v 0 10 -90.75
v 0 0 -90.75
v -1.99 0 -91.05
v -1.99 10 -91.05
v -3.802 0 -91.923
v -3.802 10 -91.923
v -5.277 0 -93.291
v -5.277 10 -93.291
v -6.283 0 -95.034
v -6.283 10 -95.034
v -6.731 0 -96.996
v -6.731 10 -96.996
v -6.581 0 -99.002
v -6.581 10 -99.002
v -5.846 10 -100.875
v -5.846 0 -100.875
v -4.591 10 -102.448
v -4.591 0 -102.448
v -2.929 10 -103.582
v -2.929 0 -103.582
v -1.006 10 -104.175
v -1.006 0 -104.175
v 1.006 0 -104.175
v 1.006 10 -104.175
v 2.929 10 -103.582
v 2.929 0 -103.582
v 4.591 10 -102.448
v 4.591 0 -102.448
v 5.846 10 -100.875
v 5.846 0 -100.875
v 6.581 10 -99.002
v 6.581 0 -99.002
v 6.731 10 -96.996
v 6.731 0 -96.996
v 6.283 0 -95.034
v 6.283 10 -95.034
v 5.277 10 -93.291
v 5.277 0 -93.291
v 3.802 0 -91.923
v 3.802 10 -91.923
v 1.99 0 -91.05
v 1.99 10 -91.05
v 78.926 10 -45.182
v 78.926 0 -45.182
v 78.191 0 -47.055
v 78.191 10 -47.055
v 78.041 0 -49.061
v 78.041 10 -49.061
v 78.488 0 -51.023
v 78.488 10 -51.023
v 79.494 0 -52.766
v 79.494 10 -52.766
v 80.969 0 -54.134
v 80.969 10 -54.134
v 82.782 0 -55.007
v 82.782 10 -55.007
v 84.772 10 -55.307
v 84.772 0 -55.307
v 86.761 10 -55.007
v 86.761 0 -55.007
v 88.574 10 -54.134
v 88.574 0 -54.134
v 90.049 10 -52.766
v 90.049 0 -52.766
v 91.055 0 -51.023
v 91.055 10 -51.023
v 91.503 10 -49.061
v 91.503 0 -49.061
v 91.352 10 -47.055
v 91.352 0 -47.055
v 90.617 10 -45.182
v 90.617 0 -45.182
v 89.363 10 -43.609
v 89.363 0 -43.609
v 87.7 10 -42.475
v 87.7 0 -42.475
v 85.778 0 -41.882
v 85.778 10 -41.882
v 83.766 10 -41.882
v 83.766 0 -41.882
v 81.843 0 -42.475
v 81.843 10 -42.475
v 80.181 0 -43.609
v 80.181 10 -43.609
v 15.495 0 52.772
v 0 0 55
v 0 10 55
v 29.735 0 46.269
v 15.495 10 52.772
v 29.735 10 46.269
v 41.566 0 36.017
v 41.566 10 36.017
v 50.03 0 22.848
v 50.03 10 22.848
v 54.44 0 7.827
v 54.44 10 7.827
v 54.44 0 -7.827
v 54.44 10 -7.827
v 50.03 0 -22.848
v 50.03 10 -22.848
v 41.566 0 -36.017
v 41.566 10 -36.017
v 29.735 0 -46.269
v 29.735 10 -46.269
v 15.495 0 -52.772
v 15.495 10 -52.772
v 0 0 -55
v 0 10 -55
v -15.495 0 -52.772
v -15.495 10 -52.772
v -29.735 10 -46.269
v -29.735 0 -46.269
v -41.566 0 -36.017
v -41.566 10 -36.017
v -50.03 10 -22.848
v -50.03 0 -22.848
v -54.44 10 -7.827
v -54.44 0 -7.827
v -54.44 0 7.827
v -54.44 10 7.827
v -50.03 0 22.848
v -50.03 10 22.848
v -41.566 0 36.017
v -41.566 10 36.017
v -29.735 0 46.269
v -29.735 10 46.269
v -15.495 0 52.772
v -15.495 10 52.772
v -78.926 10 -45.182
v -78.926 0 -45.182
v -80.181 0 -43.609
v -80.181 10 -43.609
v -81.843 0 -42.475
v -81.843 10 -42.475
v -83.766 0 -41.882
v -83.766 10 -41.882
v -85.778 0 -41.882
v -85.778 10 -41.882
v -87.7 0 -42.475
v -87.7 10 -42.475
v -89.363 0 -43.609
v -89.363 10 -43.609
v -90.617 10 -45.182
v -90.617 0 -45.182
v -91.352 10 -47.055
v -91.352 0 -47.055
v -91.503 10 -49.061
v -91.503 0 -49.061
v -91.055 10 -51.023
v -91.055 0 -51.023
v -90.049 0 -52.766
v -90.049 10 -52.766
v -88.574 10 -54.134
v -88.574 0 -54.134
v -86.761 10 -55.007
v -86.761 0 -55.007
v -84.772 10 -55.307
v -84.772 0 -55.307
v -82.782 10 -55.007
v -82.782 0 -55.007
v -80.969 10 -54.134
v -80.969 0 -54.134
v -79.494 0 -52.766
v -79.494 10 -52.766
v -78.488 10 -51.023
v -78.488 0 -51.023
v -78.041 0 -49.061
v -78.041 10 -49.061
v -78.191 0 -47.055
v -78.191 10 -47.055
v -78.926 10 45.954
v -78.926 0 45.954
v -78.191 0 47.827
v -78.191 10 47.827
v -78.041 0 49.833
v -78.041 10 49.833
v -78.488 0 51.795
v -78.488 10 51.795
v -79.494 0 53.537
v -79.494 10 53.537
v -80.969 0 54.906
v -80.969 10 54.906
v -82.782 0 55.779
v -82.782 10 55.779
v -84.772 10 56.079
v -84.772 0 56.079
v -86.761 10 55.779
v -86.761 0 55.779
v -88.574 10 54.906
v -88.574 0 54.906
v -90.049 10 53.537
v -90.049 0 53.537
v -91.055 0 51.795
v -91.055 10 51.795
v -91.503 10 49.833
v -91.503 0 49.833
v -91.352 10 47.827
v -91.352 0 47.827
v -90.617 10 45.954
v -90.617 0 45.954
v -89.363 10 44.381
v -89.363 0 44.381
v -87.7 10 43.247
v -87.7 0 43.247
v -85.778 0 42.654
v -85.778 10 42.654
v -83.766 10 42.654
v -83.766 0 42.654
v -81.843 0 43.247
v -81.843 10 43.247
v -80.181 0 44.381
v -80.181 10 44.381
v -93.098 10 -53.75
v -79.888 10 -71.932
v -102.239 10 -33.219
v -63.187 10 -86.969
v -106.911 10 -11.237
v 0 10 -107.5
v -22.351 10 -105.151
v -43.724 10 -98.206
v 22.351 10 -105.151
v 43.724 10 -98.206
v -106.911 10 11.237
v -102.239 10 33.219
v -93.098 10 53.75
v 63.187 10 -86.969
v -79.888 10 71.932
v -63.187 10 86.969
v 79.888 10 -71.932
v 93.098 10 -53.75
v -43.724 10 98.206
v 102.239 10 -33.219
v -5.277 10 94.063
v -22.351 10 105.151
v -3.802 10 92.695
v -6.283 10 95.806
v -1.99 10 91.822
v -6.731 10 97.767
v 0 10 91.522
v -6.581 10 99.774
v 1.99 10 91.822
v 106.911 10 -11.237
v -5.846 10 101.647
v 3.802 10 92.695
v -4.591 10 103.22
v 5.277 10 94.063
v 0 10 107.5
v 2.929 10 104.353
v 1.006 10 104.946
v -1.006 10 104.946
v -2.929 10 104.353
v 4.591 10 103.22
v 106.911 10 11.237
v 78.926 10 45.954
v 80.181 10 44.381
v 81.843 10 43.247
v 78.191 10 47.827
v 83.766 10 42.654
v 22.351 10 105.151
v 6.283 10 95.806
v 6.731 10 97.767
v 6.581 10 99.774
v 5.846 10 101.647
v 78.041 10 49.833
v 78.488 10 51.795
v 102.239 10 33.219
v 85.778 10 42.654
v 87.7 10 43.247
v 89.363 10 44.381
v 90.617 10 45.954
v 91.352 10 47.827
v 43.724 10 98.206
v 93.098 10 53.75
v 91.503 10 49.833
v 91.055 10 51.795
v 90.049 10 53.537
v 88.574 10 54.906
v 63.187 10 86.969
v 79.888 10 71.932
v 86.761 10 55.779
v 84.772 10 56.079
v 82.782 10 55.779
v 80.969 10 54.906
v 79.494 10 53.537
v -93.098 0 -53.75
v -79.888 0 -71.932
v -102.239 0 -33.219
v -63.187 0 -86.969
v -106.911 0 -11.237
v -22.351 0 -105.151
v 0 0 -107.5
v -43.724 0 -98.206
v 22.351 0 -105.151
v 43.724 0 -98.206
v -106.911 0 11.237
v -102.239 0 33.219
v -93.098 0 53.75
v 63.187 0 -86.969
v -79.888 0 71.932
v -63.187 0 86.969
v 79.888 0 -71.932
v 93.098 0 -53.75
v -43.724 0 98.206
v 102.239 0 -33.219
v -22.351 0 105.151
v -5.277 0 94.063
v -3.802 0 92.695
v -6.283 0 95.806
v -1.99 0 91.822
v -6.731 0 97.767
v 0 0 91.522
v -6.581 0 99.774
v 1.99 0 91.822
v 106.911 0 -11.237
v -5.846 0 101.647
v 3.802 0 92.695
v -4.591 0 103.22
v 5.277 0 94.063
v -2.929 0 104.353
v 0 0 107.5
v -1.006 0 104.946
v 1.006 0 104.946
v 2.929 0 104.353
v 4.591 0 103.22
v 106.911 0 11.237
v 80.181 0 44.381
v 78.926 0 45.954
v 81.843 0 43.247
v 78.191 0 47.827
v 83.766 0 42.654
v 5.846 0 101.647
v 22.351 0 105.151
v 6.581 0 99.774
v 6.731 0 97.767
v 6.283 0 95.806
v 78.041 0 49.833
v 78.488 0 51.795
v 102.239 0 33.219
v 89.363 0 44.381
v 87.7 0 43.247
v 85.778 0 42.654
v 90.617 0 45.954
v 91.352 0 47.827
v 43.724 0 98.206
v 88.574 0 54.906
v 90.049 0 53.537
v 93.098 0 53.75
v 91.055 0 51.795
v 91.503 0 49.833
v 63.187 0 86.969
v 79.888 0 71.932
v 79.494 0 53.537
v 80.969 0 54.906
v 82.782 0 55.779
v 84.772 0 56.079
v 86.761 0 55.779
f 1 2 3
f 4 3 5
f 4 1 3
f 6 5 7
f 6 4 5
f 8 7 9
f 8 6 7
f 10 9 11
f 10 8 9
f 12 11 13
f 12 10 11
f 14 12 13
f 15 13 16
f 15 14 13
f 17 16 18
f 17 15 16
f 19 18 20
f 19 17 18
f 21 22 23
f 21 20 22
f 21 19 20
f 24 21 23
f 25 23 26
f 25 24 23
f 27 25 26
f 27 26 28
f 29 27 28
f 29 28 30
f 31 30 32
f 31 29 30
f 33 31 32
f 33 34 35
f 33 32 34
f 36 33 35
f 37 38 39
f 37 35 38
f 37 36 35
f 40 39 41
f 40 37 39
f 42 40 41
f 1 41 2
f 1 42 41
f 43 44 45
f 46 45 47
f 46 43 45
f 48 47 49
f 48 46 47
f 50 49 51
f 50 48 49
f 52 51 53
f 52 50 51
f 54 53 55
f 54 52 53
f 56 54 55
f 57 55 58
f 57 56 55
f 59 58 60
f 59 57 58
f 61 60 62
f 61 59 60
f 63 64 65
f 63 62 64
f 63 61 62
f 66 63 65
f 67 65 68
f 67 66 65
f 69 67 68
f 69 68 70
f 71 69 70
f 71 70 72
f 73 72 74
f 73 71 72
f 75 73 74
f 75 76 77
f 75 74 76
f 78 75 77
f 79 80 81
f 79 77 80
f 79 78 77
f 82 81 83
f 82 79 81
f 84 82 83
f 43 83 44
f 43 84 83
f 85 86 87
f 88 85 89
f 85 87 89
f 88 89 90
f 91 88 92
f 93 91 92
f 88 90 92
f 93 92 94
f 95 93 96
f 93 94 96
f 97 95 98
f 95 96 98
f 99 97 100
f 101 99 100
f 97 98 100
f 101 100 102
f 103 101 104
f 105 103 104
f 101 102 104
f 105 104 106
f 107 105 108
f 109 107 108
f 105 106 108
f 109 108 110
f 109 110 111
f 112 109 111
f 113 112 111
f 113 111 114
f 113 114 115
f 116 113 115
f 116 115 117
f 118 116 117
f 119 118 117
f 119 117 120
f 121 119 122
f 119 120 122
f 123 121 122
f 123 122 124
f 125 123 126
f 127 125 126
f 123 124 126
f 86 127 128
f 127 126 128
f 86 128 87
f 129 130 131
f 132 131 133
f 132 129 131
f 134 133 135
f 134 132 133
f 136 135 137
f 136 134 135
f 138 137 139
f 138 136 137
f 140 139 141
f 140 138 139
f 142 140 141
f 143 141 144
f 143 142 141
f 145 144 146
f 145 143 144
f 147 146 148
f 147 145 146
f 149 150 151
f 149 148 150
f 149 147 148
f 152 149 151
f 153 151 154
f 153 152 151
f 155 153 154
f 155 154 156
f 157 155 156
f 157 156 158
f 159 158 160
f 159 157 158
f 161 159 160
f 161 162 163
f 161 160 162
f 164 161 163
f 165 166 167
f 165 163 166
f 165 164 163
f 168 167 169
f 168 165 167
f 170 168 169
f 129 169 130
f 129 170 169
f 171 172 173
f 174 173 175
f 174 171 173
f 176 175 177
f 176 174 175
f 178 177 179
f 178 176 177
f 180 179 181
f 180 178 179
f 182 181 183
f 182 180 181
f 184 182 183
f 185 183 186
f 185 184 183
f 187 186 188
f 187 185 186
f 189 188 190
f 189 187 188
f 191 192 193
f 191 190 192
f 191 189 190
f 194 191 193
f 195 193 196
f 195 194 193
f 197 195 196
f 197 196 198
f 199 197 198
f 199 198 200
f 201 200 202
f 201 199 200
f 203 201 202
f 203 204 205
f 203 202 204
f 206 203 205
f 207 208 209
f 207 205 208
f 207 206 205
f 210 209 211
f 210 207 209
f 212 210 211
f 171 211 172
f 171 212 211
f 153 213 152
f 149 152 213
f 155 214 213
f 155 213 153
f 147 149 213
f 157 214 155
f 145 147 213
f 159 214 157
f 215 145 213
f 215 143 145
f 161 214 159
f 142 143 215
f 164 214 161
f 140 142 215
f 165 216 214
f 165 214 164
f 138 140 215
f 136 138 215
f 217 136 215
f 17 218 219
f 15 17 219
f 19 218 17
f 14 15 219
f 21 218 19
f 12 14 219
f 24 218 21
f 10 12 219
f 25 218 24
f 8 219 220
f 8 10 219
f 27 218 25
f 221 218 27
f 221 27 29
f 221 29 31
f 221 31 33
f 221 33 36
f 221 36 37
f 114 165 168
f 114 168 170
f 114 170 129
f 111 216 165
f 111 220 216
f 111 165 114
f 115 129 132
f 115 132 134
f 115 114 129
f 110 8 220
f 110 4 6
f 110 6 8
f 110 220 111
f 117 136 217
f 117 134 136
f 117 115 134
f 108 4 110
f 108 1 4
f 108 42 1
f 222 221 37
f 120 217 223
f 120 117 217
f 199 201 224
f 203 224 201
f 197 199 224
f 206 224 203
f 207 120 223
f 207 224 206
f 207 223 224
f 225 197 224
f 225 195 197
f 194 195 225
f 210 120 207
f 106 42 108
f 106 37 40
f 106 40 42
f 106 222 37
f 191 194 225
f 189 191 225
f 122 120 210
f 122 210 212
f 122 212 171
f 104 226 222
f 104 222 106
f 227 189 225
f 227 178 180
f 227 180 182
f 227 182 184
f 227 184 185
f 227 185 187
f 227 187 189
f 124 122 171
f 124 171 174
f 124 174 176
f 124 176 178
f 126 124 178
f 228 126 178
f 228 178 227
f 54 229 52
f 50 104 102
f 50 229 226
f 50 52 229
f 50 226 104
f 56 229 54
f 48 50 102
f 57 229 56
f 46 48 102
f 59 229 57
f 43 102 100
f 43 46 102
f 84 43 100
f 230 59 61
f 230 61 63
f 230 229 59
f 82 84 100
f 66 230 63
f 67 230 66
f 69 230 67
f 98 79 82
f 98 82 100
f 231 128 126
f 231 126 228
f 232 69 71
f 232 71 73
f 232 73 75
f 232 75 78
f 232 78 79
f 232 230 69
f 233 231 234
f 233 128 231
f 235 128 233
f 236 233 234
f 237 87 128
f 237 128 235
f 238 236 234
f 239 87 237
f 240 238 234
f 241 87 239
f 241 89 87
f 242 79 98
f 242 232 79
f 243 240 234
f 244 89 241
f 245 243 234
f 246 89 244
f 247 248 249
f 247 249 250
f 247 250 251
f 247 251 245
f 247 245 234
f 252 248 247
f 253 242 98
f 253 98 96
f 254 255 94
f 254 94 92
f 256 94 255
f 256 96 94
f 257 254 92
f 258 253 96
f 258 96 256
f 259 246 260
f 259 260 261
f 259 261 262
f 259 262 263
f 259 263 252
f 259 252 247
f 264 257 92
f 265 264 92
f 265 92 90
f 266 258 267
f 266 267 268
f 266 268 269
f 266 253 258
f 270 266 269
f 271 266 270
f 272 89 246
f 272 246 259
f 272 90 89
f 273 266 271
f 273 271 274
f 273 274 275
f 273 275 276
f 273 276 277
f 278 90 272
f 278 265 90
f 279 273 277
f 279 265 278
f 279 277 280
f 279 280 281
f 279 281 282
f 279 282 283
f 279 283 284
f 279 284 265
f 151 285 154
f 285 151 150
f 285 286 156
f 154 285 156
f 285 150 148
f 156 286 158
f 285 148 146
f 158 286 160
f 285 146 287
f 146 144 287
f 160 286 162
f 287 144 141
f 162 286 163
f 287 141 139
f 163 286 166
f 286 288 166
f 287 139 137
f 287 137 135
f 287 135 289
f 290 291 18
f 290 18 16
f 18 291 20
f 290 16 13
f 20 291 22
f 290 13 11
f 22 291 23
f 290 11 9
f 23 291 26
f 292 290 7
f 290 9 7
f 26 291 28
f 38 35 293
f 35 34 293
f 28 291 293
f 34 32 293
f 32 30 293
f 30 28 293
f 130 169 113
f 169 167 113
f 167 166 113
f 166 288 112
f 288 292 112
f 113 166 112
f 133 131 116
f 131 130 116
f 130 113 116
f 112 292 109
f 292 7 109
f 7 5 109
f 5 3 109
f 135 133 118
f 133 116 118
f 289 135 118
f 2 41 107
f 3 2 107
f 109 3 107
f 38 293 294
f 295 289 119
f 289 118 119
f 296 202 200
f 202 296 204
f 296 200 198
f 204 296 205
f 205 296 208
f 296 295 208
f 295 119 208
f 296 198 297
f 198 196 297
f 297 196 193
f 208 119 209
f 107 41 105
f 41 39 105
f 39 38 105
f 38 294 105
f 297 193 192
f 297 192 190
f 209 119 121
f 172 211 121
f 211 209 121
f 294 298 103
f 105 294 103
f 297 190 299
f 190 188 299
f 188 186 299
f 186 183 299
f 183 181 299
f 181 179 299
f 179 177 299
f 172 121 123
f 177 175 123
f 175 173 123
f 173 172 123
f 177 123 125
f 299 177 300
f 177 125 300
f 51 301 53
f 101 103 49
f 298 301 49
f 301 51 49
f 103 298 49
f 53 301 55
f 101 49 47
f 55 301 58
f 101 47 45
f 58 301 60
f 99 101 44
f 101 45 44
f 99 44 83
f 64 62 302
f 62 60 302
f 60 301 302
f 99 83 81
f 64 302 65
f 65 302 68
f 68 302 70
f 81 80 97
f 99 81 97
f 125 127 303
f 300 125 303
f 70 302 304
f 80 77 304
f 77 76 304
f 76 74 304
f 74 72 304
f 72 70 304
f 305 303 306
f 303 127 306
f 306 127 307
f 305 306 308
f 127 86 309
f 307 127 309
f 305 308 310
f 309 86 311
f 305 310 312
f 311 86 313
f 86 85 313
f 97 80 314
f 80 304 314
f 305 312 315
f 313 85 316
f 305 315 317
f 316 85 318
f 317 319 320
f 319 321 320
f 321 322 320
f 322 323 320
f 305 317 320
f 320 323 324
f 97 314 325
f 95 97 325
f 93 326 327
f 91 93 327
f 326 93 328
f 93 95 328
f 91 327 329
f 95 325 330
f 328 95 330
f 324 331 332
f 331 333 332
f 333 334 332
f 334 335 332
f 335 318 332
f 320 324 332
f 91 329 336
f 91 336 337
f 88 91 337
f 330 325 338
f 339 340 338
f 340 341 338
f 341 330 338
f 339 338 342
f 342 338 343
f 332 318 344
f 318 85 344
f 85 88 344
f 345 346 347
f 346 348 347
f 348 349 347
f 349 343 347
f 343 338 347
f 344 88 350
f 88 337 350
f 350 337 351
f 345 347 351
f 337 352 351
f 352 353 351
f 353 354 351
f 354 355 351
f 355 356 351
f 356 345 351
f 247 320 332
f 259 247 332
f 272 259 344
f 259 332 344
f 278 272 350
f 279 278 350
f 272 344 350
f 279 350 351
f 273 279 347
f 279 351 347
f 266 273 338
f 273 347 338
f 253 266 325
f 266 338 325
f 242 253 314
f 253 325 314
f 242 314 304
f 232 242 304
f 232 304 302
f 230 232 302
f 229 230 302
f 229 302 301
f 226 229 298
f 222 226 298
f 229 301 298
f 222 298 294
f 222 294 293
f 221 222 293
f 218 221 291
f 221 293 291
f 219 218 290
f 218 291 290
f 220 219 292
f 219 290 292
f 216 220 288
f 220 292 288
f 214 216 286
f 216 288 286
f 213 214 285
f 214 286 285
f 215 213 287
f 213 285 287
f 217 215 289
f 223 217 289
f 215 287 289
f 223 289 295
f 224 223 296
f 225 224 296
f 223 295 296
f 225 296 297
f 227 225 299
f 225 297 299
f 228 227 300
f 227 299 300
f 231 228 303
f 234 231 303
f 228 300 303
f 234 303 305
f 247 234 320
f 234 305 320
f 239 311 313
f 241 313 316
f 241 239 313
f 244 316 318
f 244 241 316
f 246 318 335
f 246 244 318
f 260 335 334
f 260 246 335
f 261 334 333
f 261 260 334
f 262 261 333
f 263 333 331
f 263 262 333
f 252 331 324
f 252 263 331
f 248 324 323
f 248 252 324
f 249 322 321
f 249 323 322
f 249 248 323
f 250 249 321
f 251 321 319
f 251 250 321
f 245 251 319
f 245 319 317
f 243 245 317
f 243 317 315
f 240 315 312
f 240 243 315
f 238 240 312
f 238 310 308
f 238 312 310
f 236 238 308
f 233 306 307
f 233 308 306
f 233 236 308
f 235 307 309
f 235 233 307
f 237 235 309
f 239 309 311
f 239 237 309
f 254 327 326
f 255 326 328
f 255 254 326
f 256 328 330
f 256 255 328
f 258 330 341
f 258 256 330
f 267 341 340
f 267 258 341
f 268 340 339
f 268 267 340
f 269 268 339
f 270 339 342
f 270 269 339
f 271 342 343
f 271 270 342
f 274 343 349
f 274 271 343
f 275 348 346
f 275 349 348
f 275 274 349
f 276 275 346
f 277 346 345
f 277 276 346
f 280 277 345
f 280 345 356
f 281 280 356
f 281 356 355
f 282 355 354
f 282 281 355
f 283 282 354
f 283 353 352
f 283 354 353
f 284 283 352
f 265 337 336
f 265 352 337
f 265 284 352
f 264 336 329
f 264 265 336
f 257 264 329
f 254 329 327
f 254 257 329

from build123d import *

# Parameters (mm, degrees)
CROQUIS1_R              = 107.5
SALIENTE_EXTRUIR1_DEPTH = 10
MATRIZC1_COUNT          = 6
CROQUIS4_R              = 55
CORTAR_EXTRUIR1_DEPTH   = 10


with BuildPart() as part:
    # Croquis1 → Saliente-Extruir1 (new body)
    with BuildSketch(Plane(origin=(0, 0, 0), x_dir=(1, 0, 0), z_dir=(0, 1, 0))):
        with Locations(Location((0, 0, 0), (0, 0, 270))):
            Circle(CROQUIS1_R)
    extrude(amount=SALIENTE_EXTRUIR1_DEPTH)

    # Croquis6 → Taladro de margen para M121 (revolve, cut)
    with BuildSketch(Plane(origin=(0, 10, -97.5), x_dir=(0, 0, 1), z_dir=(1, 0, 0))):
        Polygon((0, 0), (0, 47.555809178), (6.75, 43.5), (6.75, 0), align=None)
    taladro_de_margen_para_m121 = revolve(axis=Axis((0, 16.35, -97.5), (0, -1, 0)), mode=Mode.SUBTRACT)

    # MatrizC1: Taladro de margen para M121 ×6 about axis
    matrizc1_axis = Axis((0, 0, 0.385932096), (0, 1, 0))
    for i in range(1, MATRIZC1_COUNT):
        add(taladro_de_margen_para_m121.rotate(matrizc1_axis, i * 360 / MATRIZC1_COUNT), mode=Mode.SUBTRACT)

    # Croquis4 → Cortar-Extruir1 (cut)
    with BuildSketch(Plane(origin=(0, 10, 0), x_dir=(1, 0, 0), z_dir=(0, 1, 0))):
        with Locations(Location((0, 0, 0), (0, 0, 270))):
            Circle(CROQUIS4_R)
    extrude(amount=-CORTAR_EXTRUIR1_DEPTH, mode=Mode.SUBTRACT)


solid = part.part
